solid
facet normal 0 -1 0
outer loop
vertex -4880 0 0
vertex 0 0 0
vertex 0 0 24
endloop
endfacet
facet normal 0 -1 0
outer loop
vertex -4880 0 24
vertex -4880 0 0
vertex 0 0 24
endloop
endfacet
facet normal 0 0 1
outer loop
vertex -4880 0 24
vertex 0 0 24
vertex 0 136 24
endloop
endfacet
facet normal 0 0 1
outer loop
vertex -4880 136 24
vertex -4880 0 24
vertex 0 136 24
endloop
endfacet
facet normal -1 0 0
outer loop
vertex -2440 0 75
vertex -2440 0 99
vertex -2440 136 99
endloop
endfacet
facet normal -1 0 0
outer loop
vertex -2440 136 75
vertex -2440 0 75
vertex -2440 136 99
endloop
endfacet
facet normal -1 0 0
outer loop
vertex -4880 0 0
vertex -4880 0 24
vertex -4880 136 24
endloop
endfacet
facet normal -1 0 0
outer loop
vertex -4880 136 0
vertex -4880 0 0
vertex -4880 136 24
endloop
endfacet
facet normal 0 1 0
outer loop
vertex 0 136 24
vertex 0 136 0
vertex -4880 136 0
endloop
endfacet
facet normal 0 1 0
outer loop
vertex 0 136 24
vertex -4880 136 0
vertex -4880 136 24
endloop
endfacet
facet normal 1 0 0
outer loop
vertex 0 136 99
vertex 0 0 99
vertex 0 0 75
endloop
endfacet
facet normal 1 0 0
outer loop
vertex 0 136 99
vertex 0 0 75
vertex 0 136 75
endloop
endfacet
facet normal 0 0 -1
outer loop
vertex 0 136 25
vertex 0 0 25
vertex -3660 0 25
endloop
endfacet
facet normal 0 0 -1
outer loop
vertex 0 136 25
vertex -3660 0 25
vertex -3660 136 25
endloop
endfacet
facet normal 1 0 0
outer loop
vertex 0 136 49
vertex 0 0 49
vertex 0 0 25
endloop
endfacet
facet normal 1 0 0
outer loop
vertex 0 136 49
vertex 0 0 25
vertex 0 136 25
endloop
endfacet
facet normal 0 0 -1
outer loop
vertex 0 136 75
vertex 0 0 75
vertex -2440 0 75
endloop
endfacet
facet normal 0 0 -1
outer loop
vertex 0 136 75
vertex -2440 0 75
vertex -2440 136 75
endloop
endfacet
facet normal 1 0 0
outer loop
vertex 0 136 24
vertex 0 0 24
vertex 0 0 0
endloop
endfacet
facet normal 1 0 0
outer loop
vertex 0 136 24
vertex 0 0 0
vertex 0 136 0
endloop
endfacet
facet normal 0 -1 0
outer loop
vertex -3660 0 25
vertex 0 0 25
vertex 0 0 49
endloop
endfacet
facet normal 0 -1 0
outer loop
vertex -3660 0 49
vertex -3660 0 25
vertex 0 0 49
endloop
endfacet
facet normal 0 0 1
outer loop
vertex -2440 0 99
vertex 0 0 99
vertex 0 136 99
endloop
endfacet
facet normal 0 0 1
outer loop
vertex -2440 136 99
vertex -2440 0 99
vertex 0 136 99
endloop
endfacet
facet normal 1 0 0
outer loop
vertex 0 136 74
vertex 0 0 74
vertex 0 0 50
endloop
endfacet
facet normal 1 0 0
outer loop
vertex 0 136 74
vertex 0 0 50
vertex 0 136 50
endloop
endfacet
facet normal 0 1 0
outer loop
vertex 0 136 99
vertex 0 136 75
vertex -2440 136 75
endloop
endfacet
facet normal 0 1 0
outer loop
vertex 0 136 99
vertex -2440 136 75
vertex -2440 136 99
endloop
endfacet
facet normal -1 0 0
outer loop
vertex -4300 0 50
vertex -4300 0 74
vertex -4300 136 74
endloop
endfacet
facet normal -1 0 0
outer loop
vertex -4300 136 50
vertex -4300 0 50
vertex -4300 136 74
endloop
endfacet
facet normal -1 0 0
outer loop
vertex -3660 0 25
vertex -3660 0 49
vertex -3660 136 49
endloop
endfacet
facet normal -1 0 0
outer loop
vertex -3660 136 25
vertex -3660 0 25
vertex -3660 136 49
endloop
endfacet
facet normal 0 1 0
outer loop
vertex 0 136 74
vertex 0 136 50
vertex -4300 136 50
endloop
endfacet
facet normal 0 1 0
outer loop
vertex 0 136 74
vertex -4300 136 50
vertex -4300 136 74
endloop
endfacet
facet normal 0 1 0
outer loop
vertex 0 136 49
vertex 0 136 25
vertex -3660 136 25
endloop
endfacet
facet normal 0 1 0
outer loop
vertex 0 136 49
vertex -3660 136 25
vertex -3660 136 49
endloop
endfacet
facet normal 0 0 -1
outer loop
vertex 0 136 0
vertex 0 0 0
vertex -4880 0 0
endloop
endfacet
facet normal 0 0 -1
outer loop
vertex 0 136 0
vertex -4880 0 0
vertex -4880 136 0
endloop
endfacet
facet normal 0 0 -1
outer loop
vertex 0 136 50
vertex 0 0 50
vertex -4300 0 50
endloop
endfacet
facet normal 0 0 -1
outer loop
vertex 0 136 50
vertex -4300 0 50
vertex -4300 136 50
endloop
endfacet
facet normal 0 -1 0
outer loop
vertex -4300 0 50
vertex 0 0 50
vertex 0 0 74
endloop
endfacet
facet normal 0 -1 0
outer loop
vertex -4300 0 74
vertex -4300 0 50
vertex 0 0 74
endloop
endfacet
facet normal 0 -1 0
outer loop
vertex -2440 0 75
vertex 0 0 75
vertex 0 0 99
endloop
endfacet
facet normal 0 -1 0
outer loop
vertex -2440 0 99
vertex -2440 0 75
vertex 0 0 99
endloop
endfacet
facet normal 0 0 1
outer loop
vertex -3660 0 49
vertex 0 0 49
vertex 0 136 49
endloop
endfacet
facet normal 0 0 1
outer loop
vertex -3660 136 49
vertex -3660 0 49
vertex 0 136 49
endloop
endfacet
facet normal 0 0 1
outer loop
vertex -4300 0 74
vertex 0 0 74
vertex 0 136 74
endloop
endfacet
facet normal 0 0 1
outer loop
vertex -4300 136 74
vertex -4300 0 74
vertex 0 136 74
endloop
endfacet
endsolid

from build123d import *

# Parameters (mm, degrees)
F0_W     = 136
F0_H     = 24
F1_DEPTH = 4880
F2_DEPTH = 3660
F3_DEPTH = 4300
F4_DEPTH = 2440


with BuildPart() as f1:
    # F0 (on Right) → F1 (new body)
    with BuildSketch(Plane.YZ):
        with Locations((68, 12)):
            Rectangle(F0_W, F0_H)
    extrude(amount=-F1_DEPTH)


with BuildPart() as f2:
    # F0 (on Right) → F2 (new body)
    with BuildSketch(Plane.YZ):
        with Locations((68, 37)):
            Rectangle(F0_W, F0_H)
    extrude(amount=-F2_DEPTH)


with BuildPart() as f3:
    # F0 (on Right) → F3 (new body)
    with BuildSketch(Plane.YZ):
        with Locations((68, 62)):
            Rectangle(F0_W, F0_H)
    extrude(amount=-F3_DEPTH)


with BuildPart() as f4:
    # F0 (on Right) → F4 (new body)
    with BuildSketch(Plane.YZ):
        with Locations((68, 87)):
            Rectangle(F0_W, F0_H)
    extrude(amount=-F4_DEPTH)


solid = Compound([f1.part, f2.part, f3.part, f4.part])
